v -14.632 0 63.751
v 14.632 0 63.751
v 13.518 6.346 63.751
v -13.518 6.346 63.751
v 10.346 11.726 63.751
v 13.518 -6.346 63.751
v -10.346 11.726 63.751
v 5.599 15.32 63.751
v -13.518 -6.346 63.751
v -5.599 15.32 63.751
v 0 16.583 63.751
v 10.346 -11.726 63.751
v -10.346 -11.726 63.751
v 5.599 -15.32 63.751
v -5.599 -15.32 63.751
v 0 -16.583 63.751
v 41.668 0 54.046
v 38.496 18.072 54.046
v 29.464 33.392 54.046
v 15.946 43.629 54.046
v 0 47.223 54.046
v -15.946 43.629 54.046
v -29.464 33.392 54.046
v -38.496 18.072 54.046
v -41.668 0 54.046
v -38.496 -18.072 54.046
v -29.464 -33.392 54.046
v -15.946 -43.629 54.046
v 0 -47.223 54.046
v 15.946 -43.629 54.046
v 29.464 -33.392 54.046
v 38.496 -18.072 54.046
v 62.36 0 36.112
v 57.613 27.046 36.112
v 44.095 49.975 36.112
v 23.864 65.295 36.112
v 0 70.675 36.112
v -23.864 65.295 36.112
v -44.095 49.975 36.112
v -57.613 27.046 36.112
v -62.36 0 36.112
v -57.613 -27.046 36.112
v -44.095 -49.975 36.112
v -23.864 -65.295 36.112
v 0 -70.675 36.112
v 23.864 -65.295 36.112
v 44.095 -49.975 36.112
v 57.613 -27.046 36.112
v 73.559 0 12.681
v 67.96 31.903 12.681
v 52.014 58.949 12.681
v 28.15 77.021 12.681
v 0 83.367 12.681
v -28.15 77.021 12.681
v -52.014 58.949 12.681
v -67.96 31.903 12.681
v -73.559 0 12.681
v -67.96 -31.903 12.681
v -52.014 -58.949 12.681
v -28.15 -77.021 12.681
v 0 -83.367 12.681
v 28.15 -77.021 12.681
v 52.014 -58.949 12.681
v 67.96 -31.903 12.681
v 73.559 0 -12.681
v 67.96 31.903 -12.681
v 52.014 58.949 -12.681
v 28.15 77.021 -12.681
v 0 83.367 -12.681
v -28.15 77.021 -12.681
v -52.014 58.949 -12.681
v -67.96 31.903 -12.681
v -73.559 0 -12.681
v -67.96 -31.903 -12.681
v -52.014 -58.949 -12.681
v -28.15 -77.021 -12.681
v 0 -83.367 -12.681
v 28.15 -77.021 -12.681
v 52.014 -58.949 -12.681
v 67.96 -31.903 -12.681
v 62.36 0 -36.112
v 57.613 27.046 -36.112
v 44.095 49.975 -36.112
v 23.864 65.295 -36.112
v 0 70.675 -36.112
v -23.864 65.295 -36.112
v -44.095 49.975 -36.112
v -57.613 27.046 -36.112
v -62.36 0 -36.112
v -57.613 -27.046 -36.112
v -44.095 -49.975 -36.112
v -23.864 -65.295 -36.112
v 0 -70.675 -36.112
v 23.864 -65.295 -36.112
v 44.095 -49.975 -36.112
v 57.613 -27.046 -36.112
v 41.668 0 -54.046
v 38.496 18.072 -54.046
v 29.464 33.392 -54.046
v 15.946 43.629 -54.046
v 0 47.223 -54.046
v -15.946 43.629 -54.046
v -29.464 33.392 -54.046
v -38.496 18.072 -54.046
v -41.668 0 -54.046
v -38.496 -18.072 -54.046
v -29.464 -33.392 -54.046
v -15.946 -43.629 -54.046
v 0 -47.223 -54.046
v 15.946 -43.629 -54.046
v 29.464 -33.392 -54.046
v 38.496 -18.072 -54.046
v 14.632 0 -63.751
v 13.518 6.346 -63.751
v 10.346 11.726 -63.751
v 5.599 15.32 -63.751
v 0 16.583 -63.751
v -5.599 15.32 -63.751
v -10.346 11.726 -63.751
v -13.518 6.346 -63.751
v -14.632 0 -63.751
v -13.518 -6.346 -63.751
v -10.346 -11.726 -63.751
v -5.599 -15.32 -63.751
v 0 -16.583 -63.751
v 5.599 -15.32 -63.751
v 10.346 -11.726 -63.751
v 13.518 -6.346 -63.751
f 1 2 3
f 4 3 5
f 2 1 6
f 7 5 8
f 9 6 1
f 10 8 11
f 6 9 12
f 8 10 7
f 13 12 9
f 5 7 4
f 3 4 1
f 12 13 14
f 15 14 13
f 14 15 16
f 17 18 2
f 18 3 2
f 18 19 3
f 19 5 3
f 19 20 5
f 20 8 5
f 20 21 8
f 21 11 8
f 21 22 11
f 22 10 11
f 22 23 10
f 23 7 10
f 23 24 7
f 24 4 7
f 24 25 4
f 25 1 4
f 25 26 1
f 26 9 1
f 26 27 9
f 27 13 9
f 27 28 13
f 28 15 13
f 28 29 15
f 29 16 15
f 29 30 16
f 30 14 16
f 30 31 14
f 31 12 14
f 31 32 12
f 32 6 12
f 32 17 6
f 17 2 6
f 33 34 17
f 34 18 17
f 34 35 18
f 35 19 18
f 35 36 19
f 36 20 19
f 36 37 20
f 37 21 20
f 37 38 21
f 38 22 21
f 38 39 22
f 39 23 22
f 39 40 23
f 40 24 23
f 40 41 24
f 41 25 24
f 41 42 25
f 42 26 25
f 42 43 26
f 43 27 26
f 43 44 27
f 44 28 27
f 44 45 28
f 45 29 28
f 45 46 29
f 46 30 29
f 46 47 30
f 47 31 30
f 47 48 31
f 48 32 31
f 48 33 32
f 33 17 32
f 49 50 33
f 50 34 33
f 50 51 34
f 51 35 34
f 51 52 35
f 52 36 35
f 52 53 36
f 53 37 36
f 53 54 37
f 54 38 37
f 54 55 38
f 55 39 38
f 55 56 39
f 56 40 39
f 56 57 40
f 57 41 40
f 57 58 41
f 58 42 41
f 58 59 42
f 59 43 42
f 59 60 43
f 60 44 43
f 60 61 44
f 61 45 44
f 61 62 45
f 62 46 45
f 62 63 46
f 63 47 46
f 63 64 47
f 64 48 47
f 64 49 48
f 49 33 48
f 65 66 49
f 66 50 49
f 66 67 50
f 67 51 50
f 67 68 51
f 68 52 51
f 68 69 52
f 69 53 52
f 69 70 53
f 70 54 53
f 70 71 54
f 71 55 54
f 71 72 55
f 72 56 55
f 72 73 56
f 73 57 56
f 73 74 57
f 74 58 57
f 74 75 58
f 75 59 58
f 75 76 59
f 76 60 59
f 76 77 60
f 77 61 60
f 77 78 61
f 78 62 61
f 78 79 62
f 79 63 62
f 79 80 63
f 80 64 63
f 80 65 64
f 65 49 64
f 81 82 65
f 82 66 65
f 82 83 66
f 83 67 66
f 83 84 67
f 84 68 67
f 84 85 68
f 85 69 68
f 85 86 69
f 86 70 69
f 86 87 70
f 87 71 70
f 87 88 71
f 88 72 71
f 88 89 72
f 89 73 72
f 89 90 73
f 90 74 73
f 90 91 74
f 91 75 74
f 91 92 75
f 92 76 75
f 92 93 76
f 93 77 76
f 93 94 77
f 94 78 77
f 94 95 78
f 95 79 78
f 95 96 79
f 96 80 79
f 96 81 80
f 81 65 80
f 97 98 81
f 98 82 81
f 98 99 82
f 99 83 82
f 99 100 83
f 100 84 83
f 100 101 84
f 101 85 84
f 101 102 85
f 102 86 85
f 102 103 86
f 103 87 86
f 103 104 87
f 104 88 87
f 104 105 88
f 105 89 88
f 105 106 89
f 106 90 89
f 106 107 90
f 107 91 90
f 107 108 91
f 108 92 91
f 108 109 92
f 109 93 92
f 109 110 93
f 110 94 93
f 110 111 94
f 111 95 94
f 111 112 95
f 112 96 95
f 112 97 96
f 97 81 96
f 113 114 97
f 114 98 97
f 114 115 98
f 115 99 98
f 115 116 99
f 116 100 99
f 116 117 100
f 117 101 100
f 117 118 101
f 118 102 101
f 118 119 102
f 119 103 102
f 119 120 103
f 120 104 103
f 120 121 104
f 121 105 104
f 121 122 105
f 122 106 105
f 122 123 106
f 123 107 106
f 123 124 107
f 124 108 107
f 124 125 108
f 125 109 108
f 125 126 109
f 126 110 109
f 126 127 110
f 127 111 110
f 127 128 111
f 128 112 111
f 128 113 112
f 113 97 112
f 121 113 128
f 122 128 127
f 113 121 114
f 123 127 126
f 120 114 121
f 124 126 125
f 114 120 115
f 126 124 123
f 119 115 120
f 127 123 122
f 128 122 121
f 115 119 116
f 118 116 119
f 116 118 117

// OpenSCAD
// Generated by SolidPython 1.0.1 on 2020-07-29 00:46:52


scale(v = [15, 17, 13]) {
	sphere(r = 5);
}
/***********************************************
*********      SolidPython code:      **********
************************************************
 
# import packages: SolidPython
from solid import *
from solid.utils import *
from itertools import chain, combinations, permutations


class Resize:

    def __init__(self, scad_file):
        self.scad_file = scad_file
        #self.scad_file = import_scad(scad_file)
        # cone/cylinder param:
        self.r1 = 0
        self.r2 = 0
        self.h = 0
        # rectangular prism param:
        self.w = 0
        self.l = 0
        # ellipse param:
        self.r = 0

    # import OpenScad code (file name corresponds to shape)


    # classify shape + parameters
    def assign(self, param1, param2, param3):
        if self.scad_file == 'cone.scad':
            self.r1 = param1
            self.r2 = param2
            self.h = param3
        elif self.scad_file == 'cylinder.scad':
            self.r1 = param1
            self.r2 = param2
            self.h = param3
        elif self.scad_file == 'rectangularPrism.scad':
            self.h = param1
            self.l = param2
            self.w = param3
        else:
            self.r = param1
            self.h = param2

    # resize parameters
    def iterate(self):
        x = range(3, 20, 2)
        i = 1
        if self.scad_file == 'cone.scad':
            tempList = list(permutations(x, 2))
            for temp in tempList:
                param1 = temp[0]
                param2 = temp[1]
                filepath = 'produced_scad_files/' + 'cone' + str(param1) + '_' + str(param2) + '_' + '.scad'
                scad_render_to_file(cylinder(h=param1, r1=param2, r2=0), filepath)

        elif self.scad_file == 'cylinder.scad':
            tempList = list(permutations(x, 3))
            for temp in tempList:
                param1 = temp[0]
                param2 = temp[1]
                filepath = 'produced_scad_files/' + 'cylinder' + str(param1) + '_' + str(param2) + '_' + '.scad'
                scad_render_to_file(cylinder(h=param1, r1=param2, r2=param2), filepath)

        elif self.scad_file == 'rectangularPrism.scad':
            tempList = list(permutations(x, 3))
            for temp in tempList:
                param1 = temp[0]
                param2 = temp[1]
                param3 = temp[2]
                filepath = 'produced_scad_files/' + 'rectangularPrism' + str(param1) + '_' + str(param2) + '_' + str(
                    param3) + '.scad'
                scad_render_to_file(cube(size=(param1, param2, param3)), filepath)

        elif self.scad_file == 'ellipse.scad':
            tempList = list(permutations(x, 4))
            for temp in tempList:
                param1 = temp[0]
                param2 = temp[1]
                param3 = temp[2]
                param4 = temp[3]
                filepath = 'produced_scad_files/' + 'ellipse' + str(param1) + '_' + str(param2) + '_' + str(param3) + '_' + str(param4) + '.scad'
                scad_render_to_file(scale([param1, param2, param3])(sphere(r=param4)), filepath)

    def render_to_scadfile(self):
        scad_render_to_file(scad, 'example.scad') 
 
************************************************/
